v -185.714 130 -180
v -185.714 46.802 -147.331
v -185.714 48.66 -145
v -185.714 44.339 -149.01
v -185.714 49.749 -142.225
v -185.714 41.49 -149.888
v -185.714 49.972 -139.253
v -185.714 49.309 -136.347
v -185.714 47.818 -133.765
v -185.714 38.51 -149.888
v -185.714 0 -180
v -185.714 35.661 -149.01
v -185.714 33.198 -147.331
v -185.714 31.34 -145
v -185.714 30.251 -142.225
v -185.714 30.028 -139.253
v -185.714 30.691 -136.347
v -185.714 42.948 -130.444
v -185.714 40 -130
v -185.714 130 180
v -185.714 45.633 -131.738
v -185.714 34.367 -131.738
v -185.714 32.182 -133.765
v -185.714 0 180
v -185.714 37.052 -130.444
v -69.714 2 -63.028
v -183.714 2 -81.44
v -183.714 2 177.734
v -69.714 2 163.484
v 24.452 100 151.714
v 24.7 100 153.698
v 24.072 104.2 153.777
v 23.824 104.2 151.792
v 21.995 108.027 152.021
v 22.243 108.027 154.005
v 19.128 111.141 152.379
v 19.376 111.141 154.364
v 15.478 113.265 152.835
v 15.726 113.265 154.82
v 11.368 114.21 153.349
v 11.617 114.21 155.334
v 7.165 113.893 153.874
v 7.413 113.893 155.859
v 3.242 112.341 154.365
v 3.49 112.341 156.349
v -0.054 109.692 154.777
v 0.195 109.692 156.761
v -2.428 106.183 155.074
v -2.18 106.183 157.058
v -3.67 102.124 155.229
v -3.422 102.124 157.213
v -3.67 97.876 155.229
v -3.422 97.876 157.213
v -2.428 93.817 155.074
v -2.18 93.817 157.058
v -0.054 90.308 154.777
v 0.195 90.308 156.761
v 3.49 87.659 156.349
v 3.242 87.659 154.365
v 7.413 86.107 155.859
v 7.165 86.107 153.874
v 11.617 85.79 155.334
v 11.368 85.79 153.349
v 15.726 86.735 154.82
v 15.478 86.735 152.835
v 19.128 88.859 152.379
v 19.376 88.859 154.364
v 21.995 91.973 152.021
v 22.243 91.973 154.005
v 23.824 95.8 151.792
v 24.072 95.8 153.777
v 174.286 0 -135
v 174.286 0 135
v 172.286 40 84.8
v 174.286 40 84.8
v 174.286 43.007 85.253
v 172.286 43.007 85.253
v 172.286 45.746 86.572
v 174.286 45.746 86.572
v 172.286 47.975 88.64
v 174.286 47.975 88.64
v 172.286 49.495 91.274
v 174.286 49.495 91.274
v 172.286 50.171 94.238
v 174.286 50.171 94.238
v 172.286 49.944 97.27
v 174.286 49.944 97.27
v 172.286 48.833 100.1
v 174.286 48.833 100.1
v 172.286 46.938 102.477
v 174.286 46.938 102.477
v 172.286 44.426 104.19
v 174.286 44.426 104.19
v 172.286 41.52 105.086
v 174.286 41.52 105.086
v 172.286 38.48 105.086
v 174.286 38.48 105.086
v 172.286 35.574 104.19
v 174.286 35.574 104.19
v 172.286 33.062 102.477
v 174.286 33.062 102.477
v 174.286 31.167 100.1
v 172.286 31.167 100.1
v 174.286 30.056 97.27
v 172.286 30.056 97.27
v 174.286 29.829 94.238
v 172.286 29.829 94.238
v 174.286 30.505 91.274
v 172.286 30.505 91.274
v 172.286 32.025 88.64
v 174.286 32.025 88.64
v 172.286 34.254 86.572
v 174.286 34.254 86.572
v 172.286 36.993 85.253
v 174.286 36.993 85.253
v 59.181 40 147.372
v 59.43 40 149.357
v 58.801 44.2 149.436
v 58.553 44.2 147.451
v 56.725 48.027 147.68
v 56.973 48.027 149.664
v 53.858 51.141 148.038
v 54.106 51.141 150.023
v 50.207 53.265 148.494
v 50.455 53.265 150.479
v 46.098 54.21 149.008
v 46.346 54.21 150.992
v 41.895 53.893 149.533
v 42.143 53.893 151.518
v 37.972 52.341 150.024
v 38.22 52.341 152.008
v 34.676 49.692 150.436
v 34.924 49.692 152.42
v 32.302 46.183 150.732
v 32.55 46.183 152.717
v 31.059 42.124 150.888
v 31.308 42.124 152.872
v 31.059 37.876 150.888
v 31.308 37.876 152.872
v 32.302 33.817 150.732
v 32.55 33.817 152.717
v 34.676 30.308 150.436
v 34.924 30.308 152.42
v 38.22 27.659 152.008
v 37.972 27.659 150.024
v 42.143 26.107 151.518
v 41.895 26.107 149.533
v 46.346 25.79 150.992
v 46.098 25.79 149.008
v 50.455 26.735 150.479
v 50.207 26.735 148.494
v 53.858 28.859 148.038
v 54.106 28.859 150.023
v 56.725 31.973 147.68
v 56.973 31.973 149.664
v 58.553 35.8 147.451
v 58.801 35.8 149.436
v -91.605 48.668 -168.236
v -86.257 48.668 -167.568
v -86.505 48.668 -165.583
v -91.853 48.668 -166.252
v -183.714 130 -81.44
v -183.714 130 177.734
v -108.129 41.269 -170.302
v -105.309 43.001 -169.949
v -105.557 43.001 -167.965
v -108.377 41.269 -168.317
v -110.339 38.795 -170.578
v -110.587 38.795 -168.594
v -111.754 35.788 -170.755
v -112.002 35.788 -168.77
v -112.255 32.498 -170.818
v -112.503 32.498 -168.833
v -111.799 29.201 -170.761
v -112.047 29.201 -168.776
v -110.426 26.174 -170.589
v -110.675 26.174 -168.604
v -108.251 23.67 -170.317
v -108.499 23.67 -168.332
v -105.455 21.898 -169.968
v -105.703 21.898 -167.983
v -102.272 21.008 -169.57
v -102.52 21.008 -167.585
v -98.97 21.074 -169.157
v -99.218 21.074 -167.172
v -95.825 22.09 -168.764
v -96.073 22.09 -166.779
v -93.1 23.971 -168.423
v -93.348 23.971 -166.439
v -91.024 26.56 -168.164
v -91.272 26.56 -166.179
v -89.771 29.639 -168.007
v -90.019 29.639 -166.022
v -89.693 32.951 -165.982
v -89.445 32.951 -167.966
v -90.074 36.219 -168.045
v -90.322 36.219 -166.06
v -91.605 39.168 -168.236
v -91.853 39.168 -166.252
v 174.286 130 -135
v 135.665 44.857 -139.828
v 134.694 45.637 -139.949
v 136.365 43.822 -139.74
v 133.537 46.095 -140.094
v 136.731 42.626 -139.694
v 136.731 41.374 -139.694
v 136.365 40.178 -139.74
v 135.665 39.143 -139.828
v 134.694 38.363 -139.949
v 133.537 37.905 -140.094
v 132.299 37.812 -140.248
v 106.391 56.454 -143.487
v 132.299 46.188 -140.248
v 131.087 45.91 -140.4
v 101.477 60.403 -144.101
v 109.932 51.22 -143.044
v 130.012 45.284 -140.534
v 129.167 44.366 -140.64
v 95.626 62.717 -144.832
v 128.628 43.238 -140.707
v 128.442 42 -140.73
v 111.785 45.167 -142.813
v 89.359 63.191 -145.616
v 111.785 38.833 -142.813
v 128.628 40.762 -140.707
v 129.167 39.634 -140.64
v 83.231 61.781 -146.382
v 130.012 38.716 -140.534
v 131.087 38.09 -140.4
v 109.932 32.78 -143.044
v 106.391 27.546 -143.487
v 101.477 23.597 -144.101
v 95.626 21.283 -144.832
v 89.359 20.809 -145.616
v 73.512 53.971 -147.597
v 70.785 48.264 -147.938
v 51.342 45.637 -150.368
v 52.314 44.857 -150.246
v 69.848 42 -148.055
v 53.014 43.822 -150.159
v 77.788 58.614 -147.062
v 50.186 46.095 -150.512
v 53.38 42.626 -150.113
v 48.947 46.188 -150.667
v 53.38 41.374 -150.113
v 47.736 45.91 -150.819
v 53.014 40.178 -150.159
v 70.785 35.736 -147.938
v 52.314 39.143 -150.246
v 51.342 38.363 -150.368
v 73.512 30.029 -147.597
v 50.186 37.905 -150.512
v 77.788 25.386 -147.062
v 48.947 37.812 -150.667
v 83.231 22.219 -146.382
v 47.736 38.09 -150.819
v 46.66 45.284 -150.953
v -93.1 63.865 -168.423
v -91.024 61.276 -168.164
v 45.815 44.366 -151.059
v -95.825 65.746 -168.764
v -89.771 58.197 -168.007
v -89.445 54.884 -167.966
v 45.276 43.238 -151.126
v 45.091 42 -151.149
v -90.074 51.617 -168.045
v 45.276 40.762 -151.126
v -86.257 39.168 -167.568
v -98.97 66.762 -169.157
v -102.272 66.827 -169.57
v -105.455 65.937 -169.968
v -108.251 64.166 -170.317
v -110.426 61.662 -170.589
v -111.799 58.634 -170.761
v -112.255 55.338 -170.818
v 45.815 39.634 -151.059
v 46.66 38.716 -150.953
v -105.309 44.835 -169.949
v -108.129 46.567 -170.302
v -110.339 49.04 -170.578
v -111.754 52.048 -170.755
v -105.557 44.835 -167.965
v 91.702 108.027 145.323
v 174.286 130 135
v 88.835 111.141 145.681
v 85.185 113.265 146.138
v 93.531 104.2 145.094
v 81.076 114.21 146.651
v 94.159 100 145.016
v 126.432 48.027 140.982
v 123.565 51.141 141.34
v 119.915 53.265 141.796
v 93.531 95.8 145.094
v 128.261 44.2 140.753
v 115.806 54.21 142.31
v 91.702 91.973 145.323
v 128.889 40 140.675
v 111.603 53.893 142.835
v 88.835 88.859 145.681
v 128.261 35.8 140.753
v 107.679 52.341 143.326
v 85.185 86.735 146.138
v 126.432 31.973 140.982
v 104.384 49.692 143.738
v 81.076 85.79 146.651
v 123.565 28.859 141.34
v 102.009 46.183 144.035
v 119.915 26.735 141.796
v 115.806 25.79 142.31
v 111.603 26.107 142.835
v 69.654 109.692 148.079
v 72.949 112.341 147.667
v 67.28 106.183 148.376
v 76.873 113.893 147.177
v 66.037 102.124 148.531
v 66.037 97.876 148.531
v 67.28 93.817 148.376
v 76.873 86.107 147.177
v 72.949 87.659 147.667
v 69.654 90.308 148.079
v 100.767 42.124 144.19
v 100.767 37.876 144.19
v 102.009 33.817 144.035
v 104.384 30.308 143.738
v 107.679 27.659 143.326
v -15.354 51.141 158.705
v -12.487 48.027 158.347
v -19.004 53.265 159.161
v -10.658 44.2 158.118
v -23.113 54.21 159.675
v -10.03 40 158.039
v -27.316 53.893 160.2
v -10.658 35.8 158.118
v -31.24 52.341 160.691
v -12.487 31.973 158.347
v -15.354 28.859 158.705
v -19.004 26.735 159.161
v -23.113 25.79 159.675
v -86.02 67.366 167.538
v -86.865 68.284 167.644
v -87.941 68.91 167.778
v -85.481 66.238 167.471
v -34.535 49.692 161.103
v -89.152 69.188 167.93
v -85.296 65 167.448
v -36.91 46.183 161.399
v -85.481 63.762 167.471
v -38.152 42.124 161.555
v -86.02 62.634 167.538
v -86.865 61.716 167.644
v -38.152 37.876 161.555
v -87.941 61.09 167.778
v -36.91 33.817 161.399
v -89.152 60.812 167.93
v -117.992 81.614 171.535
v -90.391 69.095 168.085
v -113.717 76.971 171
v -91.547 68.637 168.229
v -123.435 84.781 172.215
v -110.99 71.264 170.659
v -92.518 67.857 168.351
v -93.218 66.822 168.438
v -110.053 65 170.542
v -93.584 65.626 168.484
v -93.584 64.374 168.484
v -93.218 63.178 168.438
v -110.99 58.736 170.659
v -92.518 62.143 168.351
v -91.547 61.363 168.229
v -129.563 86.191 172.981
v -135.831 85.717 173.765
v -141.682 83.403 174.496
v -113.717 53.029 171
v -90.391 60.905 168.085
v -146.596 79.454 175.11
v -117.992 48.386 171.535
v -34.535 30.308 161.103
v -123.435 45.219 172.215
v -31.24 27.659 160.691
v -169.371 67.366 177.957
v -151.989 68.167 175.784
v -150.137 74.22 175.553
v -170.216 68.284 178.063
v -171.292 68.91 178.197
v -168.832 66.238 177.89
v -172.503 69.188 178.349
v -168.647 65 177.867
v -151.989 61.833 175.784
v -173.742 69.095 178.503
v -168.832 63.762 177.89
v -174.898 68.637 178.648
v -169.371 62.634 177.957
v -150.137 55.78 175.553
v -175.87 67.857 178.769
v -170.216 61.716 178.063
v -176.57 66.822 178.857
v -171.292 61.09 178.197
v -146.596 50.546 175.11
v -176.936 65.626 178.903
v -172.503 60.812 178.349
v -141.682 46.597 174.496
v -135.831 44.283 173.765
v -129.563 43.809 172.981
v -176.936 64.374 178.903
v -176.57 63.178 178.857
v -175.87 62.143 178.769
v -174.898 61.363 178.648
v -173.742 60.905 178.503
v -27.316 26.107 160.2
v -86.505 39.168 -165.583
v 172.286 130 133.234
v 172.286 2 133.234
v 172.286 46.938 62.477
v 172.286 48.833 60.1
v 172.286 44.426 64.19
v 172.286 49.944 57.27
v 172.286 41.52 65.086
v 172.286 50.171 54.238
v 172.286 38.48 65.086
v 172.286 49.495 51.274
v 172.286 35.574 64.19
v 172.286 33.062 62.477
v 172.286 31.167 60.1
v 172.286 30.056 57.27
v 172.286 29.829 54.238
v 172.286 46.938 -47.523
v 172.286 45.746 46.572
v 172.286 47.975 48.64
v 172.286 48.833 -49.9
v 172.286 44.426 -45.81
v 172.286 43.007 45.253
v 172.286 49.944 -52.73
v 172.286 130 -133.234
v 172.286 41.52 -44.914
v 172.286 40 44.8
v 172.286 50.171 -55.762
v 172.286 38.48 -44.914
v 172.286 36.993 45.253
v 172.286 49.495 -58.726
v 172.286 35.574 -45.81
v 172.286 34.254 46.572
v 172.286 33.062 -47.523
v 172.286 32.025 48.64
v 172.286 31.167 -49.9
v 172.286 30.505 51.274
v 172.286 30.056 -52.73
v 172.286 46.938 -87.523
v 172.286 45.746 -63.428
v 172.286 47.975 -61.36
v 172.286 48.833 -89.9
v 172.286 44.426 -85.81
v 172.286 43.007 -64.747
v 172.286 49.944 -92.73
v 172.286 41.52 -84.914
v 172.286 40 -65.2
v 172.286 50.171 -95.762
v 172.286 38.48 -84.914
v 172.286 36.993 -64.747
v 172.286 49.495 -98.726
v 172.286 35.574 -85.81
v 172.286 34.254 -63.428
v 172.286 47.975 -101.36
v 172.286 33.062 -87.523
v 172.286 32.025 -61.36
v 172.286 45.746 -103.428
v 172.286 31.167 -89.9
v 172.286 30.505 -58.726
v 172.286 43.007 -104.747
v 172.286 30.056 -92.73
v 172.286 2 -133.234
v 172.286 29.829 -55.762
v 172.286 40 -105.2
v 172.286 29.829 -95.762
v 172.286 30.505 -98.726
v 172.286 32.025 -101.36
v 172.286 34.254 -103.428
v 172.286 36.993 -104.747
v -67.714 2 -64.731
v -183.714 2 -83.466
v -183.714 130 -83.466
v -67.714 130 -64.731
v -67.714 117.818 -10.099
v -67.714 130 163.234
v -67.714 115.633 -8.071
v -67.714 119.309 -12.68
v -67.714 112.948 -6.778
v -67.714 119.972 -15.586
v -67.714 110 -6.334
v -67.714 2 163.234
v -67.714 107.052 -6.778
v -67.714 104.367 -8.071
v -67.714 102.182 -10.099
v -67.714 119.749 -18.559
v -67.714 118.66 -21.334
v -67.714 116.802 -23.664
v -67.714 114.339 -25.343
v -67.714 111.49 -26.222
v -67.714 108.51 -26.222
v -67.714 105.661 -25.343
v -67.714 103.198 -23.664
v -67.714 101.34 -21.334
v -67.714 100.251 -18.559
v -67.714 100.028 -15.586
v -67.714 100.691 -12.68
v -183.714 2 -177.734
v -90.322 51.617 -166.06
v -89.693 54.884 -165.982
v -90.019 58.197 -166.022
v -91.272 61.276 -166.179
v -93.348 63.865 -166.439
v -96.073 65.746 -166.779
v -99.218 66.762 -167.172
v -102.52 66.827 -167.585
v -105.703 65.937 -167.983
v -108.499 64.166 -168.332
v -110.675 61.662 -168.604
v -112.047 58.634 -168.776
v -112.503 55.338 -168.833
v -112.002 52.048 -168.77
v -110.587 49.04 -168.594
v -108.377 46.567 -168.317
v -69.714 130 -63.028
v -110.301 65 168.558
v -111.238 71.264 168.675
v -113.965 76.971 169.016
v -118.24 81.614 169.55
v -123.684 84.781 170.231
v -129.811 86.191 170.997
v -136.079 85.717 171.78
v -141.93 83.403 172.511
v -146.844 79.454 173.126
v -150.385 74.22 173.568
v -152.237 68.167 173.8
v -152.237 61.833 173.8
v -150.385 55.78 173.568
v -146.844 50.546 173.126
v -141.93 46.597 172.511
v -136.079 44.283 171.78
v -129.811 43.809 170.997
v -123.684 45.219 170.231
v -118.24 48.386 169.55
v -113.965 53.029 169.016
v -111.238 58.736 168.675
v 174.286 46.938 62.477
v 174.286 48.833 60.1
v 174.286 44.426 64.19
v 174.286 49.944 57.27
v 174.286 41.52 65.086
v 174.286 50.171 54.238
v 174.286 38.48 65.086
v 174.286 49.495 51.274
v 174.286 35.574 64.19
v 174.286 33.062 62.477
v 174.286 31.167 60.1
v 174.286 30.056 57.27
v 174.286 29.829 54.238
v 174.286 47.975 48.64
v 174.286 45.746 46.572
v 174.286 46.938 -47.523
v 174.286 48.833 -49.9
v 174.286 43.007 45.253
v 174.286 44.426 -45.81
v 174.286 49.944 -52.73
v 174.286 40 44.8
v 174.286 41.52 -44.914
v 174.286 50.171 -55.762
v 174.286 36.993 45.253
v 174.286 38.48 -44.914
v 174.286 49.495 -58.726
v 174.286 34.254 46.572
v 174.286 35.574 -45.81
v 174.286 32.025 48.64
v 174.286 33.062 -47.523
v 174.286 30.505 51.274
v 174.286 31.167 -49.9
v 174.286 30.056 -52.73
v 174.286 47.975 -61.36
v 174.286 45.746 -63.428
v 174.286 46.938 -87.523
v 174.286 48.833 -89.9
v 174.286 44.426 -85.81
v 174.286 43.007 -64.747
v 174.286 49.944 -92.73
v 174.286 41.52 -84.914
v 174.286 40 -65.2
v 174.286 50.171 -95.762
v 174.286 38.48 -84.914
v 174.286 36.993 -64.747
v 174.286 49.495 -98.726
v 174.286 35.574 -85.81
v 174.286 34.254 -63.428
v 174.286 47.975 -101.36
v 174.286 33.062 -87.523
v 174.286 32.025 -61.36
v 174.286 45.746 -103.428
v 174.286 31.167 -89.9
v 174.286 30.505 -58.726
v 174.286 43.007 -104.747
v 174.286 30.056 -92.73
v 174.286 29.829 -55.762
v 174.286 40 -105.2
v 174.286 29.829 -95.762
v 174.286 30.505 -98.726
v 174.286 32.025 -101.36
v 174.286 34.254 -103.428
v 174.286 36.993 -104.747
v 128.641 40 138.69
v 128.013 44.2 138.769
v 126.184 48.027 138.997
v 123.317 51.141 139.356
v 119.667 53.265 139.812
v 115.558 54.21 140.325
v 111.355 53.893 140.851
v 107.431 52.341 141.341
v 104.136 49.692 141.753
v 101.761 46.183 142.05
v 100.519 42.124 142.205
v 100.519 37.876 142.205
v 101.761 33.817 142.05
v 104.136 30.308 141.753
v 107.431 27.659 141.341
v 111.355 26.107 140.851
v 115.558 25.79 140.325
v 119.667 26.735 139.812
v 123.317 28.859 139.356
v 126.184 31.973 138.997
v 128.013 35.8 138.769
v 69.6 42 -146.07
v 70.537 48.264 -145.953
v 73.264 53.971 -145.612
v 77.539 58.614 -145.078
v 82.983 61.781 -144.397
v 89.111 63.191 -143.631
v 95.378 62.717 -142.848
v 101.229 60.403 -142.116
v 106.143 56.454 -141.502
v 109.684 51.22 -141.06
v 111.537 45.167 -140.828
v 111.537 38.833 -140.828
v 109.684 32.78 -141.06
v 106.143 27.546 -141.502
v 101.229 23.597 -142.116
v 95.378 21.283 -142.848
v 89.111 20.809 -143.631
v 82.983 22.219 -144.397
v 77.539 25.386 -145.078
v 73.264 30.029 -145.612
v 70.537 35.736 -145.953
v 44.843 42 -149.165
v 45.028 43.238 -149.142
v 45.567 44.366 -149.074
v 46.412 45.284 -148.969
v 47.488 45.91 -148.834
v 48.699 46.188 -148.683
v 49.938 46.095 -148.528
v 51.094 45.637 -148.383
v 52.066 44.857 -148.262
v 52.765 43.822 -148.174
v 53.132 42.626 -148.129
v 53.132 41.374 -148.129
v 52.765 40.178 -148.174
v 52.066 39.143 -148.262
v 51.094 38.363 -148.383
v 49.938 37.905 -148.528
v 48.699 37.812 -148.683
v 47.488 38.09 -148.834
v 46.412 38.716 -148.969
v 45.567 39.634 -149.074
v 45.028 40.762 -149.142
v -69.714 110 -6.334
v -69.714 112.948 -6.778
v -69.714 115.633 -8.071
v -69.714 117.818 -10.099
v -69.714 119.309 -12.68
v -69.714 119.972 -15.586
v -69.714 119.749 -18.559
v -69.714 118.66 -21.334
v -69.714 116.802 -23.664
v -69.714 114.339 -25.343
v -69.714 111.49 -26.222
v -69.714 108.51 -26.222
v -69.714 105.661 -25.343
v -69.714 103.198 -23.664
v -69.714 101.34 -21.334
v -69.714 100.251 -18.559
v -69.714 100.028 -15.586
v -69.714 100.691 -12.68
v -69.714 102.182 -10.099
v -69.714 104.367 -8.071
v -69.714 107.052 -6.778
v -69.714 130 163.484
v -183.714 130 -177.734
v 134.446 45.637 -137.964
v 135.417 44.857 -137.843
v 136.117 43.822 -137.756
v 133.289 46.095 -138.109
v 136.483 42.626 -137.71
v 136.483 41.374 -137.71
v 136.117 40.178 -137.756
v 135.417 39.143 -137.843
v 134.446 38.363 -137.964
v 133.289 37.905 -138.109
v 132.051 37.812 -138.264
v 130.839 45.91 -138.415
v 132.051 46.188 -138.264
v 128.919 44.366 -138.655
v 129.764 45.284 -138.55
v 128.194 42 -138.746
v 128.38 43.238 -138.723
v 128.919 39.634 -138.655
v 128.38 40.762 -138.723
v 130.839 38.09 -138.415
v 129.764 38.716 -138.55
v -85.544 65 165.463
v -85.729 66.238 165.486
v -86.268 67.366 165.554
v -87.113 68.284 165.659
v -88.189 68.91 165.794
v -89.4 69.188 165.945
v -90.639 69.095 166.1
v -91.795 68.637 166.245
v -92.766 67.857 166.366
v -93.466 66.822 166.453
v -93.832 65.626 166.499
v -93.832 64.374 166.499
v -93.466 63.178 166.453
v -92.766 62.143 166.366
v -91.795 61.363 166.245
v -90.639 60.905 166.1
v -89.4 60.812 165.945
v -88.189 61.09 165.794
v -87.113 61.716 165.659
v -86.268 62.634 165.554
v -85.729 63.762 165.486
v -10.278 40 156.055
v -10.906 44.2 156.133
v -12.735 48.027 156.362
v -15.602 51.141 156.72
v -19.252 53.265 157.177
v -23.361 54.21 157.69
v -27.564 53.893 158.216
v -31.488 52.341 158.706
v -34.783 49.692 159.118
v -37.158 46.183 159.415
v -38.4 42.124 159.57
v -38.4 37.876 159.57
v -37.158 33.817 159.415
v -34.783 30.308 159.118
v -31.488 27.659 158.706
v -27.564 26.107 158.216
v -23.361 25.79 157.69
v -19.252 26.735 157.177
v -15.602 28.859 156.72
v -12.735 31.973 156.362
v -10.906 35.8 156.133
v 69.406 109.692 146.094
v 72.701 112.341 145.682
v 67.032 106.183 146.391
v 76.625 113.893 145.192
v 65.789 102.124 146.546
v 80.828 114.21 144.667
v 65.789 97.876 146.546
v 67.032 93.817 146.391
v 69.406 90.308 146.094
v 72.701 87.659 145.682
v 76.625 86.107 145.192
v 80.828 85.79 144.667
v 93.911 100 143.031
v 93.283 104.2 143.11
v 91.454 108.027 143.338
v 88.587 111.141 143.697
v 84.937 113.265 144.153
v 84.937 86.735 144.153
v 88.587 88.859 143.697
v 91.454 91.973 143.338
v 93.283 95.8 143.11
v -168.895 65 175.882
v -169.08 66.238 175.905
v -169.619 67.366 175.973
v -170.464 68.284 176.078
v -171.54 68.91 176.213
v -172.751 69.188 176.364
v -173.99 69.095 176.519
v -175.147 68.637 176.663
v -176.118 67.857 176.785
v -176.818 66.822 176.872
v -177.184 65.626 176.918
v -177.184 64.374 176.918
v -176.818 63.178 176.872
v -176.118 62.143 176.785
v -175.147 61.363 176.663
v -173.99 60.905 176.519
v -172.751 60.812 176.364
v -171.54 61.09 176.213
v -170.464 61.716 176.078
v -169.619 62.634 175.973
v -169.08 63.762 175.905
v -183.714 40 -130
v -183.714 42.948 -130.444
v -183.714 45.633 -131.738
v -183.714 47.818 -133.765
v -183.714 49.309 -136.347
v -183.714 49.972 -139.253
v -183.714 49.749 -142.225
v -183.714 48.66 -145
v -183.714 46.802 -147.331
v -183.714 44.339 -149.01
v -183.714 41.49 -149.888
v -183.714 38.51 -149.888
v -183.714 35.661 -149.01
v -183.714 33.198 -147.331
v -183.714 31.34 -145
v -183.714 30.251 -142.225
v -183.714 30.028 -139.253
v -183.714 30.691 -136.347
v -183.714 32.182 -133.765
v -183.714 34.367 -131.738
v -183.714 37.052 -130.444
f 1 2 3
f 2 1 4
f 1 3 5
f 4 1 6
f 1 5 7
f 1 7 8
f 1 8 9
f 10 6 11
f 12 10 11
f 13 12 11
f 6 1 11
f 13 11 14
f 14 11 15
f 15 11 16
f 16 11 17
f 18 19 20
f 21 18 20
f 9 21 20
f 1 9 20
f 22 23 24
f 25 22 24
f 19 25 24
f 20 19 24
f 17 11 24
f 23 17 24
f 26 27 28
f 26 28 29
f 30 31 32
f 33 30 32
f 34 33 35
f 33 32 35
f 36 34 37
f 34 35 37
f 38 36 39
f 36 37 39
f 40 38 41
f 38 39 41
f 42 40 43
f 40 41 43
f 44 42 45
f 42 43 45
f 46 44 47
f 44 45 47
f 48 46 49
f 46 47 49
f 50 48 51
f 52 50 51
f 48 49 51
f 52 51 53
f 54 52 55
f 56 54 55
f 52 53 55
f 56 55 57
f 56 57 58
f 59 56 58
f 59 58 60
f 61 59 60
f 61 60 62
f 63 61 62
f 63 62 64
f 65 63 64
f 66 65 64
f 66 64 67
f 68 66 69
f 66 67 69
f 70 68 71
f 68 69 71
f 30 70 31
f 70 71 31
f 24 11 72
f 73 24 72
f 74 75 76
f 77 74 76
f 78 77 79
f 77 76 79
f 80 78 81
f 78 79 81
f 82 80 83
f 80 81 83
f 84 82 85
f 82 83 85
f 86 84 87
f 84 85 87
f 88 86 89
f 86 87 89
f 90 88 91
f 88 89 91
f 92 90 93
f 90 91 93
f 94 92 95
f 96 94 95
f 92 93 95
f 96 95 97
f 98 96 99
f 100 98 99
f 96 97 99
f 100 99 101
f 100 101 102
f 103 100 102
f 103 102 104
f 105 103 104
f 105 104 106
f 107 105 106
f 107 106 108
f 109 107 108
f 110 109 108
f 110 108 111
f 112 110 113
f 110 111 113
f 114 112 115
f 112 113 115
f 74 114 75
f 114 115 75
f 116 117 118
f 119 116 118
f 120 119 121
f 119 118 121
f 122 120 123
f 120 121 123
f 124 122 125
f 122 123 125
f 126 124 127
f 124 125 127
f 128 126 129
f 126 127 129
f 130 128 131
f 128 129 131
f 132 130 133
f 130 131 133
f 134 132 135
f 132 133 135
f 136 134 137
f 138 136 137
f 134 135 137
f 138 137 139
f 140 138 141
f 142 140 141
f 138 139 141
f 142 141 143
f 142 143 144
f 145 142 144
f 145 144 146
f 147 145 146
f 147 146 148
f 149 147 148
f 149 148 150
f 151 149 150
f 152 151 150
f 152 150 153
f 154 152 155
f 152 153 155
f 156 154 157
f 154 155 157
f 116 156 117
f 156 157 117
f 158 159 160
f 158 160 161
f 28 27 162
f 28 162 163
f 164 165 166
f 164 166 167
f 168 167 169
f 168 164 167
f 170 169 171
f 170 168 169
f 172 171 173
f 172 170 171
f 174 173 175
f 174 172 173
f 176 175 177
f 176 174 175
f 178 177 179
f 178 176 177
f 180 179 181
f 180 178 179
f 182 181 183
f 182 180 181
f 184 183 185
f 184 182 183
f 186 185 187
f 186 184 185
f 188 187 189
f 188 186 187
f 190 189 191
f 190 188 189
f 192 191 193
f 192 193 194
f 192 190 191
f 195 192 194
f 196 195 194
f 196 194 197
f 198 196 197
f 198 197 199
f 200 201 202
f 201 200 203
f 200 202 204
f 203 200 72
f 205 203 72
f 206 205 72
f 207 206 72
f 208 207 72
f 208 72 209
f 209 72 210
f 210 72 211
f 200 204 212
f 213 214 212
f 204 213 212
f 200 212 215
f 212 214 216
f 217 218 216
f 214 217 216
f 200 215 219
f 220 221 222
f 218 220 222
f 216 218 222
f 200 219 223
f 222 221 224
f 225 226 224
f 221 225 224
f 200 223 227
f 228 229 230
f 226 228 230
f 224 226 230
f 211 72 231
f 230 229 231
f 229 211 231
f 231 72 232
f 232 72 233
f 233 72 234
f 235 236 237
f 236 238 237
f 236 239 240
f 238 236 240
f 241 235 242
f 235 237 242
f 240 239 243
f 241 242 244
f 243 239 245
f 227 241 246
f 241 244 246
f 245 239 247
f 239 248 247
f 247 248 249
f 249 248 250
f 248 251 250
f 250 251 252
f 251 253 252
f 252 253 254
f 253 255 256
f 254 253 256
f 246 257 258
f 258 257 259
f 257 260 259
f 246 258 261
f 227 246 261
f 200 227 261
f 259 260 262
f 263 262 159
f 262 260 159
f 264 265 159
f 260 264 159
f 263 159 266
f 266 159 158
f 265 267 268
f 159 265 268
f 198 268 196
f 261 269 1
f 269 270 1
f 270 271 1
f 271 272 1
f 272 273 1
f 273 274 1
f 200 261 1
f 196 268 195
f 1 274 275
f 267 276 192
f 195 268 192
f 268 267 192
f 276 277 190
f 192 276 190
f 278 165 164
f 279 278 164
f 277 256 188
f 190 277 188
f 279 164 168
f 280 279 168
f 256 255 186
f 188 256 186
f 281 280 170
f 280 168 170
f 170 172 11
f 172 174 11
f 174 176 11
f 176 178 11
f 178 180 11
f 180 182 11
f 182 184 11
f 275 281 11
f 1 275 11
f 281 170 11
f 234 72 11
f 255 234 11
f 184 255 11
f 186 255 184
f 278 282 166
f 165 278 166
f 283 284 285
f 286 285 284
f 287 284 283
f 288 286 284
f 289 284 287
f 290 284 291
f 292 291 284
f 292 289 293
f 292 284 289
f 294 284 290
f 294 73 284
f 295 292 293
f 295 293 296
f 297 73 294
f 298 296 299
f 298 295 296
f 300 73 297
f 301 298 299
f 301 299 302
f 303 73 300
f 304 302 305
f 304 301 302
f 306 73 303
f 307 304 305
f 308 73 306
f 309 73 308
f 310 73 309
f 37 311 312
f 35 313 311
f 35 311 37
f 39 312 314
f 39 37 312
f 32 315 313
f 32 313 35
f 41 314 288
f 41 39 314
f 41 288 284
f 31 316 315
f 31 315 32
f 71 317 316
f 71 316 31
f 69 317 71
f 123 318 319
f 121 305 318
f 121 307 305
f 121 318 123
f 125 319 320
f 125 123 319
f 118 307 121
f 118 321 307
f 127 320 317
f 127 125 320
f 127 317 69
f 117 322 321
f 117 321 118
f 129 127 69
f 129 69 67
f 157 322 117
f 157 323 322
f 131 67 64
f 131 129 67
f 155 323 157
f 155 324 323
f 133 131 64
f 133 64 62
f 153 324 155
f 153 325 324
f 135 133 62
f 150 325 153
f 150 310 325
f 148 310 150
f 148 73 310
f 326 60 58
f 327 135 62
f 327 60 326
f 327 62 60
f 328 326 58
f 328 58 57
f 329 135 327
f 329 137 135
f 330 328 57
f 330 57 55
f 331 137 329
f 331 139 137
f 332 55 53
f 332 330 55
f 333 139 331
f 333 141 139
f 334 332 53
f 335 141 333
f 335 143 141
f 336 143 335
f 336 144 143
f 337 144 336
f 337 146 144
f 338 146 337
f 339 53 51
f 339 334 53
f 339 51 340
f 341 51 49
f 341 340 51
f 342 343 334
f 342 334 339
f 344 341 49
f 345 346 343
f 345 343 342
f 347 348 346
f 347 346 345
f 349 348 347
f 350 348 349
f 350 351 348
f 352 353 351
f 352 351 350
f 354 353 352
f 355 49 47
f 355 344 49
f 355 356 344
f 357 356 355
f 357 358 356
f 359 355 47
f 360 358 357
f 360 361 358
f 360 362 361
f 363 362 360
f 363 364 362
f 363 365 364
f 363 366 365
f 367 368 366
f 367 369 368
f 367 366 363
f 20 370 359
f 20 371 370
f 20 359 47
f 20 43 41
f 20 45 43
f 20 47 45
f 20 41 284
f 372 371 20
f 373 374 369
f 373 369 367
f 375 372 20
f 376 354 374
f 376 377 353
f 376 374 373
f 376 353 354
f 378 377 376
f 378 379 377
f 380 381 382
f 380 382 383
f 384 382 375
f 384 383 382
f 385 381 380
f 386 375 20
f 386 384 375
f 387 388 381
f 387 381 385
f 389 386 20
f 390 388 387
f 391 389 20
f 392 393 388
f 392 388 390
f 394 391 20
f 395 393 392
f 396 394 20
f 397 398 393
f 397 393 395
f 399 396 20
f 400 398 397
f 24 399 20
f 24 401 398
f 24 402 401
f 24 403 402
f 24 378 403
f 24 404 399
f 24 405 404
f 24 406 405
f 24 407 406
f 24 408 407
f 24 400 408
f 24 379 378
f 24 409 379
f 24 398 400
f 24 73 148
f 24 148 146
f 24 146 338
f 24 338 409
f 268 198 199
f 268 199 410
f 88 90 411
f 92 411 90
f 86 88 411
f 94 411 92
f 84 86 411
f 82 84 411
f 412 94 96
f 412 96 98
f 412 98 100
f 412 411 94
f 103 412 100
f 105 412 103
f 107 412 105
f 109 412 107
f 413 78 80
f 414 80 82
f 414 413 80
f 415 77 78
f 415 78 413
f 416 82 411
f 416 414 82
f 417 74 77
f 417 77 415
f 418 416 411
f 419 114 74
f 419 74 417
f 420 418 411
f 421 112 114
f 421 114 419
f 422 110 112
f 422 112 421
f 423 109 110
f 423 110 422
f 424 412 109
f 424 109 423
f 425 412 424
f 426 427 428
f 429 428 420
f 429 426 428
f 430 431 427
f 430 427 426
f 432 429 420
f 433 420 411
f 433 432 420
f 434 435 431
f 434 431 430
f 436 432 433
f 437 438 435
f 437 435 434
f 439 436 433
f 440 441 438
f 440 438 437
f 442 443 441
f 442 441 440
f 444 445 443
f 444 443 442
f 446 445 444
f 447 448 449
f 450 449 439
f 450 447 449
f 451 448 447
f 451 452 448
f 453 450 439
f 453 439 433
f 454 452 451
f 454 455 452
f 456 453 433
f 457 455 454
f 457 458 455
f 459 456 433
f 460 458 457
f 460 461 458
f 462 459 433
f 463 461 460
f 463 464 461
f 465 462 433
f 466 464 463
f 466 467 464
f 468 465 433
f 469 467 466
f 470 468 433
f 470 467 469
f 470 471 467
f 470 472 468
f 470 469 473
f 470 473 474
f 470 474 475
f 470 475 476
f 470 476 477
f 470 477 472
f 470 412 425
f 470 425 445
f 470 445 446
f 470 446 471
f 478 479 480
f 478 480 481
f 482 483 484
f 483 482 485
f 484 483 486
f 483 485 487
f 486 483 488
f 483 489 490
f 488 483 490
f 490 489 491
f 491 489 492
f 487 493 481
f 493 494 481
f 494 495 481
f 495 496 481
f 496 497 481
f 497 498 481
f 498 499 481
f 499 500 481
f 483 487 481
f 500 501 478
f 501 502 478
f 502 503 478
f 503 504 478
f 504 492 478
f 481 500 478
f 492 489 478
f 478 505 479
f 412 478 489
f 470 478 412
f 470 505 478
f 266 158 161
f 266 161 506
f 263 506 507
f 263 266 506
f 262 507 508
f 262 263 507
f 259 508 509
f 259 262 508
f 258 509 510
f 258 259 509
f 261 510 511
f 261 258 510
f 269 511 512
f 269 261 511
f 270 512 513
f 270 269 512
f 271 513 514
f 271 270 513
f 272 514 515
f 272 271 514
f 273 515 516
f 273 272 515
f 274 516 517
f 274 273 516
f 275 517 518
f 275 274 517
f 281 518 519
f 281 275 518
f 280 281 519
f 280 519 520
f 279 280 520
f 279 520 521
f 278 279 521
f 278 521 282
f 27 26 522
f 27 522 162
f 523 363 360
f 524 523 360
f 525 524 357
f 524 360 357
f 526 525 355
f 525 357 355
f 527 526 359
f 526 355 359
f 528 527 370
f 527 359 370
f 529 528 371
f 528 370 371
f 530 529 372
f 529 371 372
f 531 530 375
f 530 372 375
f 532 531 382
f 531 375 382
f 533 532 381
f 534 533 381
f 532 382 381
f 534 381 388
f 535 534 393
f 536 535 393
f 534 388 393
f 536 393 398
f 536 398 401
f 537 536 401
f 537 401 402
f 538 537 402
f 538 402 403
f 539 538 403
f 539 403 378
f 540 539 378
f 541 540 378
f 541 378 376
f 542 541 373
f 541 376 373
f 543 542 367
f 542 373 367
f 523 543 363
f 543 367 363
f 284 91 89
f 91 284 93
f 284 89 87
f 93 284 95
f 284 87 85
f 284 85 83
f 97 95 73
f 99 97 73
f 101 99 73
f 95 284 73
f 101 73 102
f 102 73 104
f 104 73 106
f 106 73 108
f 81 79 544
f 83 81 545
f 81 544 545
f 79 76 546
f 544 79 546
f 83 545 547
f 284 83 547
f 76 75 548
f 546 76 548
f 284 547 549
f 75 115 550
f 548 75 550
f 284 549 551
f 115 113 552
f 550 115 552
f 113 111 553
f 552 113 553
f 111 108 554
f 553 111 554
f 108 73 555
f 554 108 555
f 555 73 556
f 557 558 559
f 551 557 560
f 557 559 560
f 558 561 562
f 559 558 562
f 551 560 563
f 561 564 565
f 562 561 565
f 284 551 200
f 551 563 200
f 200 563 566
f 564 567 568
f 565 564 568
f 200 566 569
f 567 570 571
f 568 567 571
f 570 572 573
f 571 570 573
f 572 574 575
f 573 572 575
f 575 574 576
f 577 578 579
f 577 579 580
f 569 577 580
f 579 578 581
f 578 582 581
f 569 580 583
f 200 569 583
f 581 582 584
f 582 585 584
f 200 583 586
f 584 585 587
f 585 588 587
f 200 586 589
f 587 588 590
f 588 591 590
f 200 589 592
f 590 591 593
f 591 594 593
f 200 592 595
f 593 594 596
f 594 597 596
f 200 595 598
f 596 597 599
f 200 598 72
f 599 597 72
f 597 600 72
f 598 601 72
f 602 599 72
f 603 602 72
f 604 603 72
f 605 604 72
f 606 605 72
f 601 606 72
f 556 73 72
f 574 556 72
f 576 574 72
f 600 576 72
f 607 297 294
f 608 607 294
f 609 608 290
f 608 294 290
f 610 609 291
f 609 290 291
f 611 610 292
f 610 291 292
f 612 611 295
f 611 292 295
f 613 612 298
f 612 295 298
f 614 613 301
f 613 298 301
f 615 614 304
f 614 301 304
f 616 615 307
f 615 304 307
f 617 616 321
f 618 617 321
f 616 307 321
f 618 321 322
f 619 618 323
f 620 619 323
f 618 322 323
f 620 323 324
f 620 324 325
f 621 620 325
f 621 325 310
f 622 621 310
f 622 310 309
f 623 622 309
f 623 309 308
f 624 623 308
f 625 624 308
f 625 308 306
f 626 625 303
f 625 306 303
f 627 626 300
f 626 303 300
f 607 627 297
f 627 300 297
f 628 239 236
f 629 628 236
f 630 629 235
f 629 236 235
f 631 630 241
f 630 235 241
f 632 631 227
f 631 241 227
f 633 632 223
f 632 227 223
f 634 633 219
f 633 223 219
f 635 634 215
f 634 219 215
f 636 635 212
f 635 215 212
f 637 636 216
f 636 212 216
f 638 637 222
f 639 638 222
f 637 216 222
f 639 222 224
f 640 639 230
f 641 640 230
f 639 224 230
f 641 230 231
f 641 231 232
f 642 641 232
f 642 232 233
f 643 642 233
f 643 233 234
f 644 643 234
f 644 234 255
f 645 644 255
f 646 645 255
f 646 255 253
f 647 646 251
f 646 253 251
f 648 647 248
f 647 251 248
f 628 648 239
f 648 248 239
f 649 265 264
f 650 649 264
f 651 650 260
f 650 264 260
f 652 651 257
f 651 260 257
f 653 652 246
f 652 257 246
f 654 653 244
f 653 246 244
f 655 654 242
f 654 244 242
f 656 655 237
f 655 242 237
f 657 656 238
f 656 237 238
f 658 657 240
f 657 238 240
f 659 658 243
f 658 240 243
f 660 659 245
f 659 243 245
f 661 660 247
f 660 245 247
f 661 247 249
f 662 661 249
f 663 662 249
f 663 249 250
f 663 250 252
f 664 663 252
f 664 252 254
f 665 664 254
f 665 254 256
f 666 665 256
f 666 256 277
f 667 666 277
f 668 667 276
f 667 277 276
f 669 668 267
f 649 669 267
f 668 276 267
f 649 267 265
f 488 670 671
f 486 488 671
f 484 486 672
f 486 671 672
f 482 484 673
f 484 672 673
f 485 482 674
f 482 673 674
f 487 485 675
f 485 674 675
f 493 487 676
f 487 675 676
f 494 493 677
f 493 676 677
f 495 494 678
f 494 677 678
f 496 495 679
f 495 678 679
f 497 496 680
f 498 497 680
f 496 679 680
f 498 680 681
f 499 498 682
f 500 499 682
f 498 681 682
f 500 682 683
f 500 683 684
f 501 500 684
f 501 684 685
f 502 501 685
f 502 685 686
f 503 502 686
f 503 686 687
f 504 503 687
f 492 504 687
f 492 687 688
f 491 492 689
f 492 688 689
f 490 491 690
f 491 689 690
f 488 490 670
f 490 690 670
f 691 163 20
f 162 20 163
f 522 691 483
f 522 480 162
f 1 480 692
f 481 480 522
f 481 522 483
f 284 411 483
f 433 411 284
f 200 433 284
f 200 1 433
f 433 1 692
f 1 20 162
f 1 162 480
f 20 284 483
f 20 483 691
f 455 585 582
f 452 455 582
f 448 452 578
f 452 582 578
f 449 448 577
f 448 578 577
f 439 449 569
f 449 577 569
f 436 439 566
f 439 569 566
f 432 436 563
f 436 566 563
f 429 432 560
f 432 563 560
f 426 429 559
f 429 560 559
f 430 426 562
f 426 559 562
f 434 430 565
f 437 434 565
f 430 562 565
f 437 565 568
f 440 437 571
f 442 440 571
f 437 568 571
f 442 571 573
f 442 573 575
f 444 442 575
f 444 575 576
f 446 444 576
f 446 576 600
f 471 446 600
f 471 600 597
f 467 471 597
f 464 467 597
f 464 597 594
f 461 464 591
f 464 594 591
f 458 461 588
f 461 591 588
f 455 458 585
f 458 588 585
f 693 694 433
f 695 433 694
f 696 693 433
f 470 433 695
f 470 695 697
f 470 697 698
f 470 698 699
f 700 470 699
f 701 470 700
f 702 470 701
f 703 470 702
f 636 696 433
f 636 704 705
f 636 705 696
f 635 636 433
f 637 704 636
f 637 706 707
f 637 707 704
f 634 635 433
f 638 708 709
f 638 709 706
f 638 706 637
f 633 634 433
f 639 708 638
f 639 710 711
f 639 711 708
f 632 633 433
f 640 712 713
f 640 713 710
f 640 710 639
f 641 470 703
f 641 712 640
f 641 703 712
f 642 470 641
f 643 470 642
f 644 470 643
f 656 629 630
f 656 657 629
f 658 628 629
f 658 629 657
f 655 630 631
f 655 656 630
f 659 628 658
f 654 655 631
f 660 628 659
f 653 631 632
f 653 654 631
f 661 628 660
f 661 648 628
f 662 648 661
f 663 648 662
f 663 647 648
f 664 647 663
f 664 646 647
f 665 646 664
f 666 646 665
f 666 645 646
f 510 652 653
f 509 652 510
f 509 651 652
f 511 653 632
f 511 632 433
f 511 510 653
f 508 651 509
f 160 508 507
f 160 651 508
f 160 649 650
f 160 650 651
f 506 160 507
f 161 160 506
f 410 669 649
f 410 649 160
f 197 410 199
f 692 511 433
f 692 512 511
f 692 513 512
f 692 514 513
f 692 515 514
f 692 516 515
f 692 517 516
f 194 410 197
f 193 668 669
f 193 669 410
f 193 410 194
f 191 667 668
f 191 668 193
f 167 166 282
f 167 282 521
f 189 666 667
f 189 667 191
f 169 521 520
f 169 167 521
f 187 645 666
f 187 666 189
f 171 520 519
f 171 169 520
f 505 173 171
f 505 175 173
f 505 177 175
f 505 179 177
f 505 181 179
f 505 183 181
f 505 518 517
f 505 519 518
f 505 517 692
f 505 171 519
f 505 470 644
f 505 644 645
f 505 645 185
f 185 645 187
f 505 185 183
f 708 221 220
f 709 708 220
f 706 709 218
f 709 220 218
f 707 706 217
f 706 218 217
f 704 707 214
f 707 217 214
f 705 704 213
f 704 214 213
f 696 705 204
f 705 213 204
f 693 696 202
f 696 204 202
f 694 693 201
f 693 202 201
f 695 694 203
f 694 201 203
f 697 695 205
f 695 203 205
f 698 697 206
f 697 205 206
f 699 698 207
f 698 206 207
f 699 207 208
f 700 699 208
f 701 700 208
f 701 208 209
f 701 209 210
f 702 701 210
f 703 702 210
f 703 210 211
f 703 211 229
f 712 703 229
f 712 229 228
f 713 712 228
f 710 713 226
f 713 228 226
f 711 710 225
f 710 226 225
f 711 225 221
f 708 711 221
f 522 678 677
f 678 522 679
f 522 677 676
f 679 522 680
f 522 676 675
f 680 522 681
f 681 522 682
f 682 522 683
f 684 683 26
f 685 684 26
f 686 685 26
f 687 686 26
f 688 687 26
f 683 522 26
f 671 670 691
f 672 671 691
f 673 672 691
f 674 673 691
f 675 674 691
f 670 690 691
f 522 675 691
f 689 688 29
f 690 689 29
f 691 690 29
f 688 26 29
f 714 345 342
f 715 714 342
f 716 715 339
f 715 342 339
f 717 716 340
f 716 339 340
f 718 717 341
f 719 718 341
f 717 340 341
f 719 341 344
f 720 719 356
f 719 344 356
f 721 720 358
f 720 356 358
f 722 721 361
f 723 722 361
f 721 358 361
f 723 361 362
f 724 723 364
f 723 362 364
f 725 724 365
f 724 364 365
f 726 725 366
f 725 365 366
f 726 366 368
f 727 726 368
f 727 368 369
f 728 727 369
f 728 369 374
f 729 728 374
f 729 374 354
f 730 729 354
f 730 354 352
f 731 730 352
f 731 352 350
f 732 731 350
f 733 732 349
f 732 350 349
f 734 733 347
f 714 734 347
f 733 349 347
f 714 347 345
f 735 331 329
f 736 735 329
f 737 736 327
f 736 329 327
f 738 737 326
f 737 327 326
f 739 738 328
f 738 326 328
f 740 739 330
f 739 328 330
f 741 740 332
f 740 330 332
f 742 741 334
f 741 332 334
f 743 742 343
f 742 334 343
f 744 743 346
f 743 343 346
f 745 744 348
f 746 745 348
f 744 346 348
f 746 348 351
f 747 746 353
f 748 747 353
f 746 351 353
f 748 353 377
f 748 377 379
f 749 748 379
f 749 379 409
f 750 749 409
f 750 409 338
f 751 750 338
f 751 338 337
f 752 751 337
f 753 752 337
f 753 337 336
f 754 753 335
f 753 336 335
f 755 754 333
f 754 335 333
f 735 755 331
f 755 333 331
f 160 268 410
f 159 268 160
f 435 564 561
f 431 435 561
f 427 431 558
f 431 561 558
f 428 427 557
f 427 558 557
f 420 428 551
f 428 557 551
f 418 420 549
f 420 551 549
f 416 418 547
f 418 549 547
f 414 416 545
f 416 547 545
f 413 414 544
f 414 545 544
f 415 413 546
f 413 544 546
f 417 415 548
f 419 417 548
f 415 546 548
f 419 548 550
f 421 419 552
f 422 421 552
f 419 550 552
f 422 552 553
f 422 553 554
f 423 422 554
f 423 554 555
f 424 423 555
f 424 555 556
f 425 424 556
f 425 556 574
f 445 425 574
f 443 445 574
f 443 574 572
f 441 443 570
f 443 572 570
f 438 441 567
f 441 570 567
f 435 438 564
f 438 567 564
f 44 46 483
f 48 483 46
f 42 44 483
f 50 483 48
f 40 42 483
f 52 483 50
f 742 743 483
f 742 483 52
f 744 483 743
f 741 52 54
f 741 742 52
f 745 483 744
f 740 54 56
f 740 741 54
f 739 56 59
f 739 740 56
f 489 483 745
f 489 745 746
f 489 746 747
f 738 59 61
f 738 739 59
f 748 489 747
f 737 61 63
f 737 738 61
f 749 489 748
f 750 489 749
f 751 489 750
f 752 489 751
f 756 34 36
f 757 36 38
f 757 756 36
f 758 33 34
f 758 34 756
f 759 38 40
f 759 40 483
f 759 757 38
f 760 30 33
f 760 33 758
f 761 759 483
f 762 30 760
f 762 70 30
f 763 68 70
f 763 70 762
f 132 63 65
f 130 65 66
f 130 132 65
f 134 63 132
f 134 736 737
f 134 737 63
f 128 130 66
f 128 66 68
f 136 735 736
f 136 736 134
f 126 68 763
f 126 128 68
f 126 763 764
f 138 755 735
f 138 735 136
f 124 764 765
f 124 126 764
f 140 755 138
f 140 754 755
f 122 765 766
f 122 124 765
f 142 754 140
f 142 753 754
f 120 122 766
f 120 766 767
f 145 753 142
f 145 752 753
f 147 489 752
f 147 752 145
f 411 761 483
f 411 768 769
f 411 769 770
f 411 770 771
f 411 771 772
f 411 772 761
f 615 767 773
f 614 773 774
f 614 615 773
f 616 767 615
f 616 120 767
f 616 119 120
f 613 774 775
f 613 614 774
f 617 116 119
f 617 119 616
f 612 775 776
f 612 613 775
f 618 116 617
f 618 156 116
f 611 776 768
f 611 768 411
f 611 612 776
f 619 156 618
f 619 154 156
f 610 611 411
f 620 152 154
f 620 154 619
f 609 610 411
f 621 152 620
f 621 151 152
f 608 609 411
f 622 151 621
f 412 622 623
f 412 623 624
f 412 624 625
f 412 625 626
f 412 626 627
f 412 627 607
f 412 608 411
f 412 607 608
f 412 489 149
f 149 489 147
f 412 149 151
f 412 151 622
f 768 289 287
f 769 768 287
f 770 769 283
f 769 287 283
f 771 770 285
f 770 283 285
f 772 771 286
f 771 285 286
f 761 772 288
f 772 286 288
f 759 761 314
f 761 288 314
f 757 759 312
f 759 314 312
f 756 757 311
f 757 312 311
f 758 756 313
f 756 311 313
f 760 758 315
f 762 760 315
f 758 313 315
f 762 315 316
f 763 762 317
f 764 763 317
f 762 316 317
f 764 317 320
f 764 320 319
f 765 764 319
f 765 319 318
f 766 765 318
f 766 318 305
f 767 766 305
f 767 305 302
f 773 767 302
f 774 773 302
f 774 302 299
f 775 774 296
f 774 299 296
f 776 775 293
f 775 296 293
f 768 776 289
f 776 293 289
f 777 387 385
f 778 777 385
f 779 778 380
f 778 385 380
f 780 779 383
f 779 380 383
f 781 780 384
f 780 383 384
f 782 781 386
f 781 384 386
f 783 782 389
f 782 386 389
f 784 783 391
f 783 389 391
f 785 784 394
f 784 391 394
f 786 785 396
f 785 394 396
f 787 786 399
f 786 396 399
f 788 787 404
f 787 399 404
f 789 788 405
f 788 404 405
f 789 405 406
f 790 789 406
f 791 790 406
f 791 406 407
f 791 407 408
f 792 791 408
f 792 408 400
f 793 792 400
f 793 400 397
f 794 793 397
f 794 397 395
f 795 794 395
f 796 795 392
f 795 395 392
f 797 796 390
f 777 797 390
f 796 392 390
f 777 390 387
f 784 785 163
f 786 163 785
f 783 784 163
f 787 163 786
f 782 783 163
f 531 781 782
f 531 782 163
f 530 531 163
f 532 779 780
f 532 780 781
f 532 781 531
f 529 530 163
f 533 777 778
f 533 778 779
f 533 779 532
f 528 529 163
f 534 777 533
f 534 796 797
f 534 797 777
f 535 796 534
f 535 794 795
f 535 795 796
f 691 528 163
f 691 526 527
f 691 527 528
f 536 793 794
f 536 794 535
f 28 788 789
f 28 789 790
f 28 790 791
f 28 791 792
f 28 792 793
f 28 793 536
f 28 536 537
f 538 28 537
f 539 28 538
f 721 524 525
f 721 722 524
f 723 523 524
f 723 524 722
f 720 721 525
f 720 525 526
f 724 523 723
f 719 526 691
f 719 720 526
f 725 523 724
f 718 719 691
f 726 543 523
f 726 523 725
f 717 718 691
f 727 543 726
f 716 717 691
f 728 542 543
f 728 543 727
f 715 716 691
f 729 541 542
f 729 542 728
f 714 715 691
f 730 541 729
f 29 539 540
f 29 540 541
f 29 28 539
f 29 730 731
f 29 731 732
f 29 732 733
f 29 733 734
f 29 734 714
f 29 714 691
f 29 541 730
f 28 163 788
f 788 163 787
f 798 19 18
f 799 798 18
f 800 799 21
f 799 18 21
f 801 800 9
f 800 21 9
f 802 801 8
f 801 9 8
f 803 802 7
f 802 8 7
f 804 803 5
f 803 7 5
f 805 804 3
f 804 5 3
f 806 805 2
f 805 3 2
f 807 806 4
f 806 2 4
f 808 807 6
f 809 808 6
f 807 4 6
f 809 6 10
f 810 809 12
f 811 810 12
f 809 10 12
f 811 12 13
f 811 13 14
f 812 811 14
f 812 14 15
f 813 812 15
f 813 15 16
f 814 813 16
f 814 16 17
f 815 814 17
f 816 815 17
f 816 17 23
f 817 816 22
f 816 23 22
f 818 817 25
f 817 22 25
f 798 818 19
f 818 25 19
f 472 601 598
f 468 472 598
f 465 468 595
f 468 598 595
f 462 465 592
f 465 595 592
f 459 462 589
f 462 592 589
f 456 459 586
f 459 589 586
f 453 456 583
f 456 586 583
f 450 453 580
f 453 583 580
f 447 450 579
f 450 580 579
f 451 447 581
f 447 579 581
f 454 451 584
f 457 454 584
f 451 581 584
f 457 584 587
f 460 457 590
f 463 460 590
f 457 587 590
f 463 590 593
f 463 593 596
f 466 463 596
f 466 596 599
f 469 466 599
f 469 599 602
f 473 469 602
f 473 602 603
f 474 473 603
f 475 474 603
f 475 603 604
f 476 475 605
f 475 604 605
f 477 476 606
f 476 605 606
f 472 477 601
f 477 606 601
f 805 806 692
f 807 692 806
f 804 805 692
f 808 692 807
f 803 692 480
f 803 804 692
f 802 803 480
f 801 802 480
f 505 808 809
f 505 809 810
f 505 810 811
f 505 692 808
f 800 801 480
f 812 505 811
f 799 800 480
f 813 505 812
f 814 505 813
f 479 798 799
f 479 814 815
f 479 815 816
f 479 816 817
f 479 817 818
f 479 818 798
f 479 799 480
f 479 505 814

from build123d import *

# Parameters (mm, degrees)
BOSS_EXTRUDE2_DEPTH = 2
BOSS_EXTRUDE3_DEPTH = 128
BOSS_EXTRUDE4_DEPTH = 128
SKETCH4_R           = 21.25
SKETCH4_R_2         = 4.2
SKETCH4_R_3         = 14.25
CUT_EXTRUDE1_DEPTH  = 2
SKETCH5_R           = 10.2
CUT_EXTRUDE2_DEPTH  = 2
SKETCH6_R           = 21.25
SKETCH6_R_2         = 4.2
CUT_EXTRUDE3_DEPTH  = 2
SKETCH7_R           = 10
CUT_EXTRUDE4_DEPTH  = 2
SKETCH8_R           = 10
CUT_EXTRUDE5_DEPTH  = 2


with BuildPart() as part:
    # Sketch1 → Boss-Extrude2 (new body)
    with BuildSketch(Plane(origin=(0, 0, 0), x_dir=(1, 0, 0), z_dir=(0, 1, 0))):
        Polygon((174.285714286, -135), (174.285714286, 135), (-185.714285714, 180), (-185.714285714, -180), align=None)
    extrude(amount=BOSS_EXTRUDE2_DEPTH)



with BuildPart() as body_2:
    # Sketch2 → Boss-Extrude3 (new body)
    with BuildSketch(Plane(origin=(0, 2, 0), x_dir=(1, 0, 0), z_dir=(0, 1, 0))):
        Polygon((174.285714286, 135), (-185.714285714, 180), (-185.714285714, -180), (174.285714286, -135), align=None)
        Polygon((172.285714286, -133.234435563), (172.285714286, 133.234435563), (-183.714285714, 177.734435563), (-183.714285714, -177.734435563), align=None, mode=Mode.SUBTRACT)
    extrude(amount=BOSS_EXTRUDE3_DEPTH)


with BuildPart() as part_1:
    add(part.part)

    add(body_2.part)  # Boss-Extrude4 merges body 2
    # Sketch3 → Boss-Extrude4 (add)
    with BuildSketch(Plane(origin=(0, 2, 0), x_dir=(1, 0, 0), z_dir=(0, 1, 0))):
        Polygon((-67.714285714, 51.491616474), (-67.714285714, -165.25), (-69.714285714, -165.5), (-69.714285714, 51.491616474), (-69.714285714, 63.028269367), (-185.714285714, 81.762993886), (-185.714285714, 83.78891024), (-67.714285714, 64.731173228), align=None)
    extrude(amount=BOSS_EXTRUDE4_DEPTH)

    # Sketch4 → Cut-Extrude1 (cut)
    with BuildSketch(Plane(origin=(19.296703297, 0, 154.373626374), x_dir=(0.9922778767136677, 0, -0.12403473458920833), z_dir=(0.12403473458920831, 0, 0.9922778767136676))):
        with Locations((-151.60642933, 65)):
            Circle(SKETCH4_R)
        with Locations((-193.60642933, 65)):
            Circle(SKETCH4_R_2)
        with Locations((-109.60642933, 65)):
            Circle(SKETCH4_R_2)
        with Locations((-43.804830657, 40)):
            Circle(SKETCH4_R_3)
        with Locations((26.195169343, 40)):
            Circle(SKETCH4_R_3)
        with Locations((96.195169343, 40)):
            Circle(SKETCH4_R_3)
        with Locations((-8.804830657, 100)):
            Circle(SKETCH4_R_3)
        with Locations((61.195169343, 100)):
            Circle(SKETCH4_R_3)
    extrude(amount=-CUT_EXTRUDE1_DEPTH, mode=Mode.SUBTRACT)

    # Sketch5 → Cut-Extrude2 (cut)
    with BuildSketch(Plane(origin=(174.285714286, 0, 0), x_dir=(0, 0, -1), z_dir=(1, 0, 0))):
        with Locations((-95, 40)):
            Circle(SKETCH5_R)
        with Locations((-55, 40)):
            Circle(SKETCH5_R)
        with Locations((55, 40)):
            Circle(SKETCH5_R)
        with Locations((95, 40)):
            Circle(SKETCH5_R)
    extrude(amount=-CUT_EXTRUDE2_DEPTH, mode=Mode.SUBTRACT)

    # Sketch6 → Cut-Extrude3 (cut)
    with BuildSketch(Plane(origin=(19.296703297, 0, -154.373626374), x_dir=(-0.9922778767136676, 0, -0.12403473458920854), z_dir=(0.12403473458920855, 0, -0.9922778767136677))):
        with Locations((-72.195169343, 42)):
            Circle(SKETCH6_R)
        with Locations((-114.195169343, 42)):
            Circle(SKETCH6_R_2)
        with Locations((-30.195169343, 42)):
            Circle(SKETCH6_R_2)
        with BuildLine():
            Line((106.375385009, 43.91775074), (106.375385009, 48.66775074))
            Line((106.375385009, 48.66775074), (111.764772784, 48.66775074))
            ThreePointArc((111.764772784, 48.66775074), (124.150849168, 66.498884266), (125.575385009, 44.834745496))
            Line((125.575385009, 44.834745496), (125.575385009, 43.000755985))
            ThreePointArc((125.575385009, 43.000755985), (124.150849168, 21.336617215), (111.764772784, 39.16775074))
            Line((111.764772784, 39.16775074), (106.375385009, 39.16775074))
            Line((106.375385009, 39.16775074), (106.375385009, 43.91775074))
        make_face()
    extrude(amount=-CUT_EXTRUDE3_DEPTH, mode=Mode.SUBTRACT)

    # Sketch7 → Cut-Extrude4 (cut)
    with BuildSketch(Plane.ZY.offset(69.714285714)):
        with Locations((-16.333563693, 110)):
            Circle(SKETCH7_R)
    extrude(amount=-CUT_EXTRUDE4_DEPTH, mode=Mode.SUBTRACT)

    # Sketch8 → Cut-Extrude5 (cut)
    with BuildSketch(Plane.ZY.offset(185.714285714)):
        with Locations((-140, 40)):
            Circle(SKETCH8_R)
    extrude(amount=-CUT_EXTRUDE5_DEPTH, mode=Mode.SUBTRACT)


solid = part_1.part
